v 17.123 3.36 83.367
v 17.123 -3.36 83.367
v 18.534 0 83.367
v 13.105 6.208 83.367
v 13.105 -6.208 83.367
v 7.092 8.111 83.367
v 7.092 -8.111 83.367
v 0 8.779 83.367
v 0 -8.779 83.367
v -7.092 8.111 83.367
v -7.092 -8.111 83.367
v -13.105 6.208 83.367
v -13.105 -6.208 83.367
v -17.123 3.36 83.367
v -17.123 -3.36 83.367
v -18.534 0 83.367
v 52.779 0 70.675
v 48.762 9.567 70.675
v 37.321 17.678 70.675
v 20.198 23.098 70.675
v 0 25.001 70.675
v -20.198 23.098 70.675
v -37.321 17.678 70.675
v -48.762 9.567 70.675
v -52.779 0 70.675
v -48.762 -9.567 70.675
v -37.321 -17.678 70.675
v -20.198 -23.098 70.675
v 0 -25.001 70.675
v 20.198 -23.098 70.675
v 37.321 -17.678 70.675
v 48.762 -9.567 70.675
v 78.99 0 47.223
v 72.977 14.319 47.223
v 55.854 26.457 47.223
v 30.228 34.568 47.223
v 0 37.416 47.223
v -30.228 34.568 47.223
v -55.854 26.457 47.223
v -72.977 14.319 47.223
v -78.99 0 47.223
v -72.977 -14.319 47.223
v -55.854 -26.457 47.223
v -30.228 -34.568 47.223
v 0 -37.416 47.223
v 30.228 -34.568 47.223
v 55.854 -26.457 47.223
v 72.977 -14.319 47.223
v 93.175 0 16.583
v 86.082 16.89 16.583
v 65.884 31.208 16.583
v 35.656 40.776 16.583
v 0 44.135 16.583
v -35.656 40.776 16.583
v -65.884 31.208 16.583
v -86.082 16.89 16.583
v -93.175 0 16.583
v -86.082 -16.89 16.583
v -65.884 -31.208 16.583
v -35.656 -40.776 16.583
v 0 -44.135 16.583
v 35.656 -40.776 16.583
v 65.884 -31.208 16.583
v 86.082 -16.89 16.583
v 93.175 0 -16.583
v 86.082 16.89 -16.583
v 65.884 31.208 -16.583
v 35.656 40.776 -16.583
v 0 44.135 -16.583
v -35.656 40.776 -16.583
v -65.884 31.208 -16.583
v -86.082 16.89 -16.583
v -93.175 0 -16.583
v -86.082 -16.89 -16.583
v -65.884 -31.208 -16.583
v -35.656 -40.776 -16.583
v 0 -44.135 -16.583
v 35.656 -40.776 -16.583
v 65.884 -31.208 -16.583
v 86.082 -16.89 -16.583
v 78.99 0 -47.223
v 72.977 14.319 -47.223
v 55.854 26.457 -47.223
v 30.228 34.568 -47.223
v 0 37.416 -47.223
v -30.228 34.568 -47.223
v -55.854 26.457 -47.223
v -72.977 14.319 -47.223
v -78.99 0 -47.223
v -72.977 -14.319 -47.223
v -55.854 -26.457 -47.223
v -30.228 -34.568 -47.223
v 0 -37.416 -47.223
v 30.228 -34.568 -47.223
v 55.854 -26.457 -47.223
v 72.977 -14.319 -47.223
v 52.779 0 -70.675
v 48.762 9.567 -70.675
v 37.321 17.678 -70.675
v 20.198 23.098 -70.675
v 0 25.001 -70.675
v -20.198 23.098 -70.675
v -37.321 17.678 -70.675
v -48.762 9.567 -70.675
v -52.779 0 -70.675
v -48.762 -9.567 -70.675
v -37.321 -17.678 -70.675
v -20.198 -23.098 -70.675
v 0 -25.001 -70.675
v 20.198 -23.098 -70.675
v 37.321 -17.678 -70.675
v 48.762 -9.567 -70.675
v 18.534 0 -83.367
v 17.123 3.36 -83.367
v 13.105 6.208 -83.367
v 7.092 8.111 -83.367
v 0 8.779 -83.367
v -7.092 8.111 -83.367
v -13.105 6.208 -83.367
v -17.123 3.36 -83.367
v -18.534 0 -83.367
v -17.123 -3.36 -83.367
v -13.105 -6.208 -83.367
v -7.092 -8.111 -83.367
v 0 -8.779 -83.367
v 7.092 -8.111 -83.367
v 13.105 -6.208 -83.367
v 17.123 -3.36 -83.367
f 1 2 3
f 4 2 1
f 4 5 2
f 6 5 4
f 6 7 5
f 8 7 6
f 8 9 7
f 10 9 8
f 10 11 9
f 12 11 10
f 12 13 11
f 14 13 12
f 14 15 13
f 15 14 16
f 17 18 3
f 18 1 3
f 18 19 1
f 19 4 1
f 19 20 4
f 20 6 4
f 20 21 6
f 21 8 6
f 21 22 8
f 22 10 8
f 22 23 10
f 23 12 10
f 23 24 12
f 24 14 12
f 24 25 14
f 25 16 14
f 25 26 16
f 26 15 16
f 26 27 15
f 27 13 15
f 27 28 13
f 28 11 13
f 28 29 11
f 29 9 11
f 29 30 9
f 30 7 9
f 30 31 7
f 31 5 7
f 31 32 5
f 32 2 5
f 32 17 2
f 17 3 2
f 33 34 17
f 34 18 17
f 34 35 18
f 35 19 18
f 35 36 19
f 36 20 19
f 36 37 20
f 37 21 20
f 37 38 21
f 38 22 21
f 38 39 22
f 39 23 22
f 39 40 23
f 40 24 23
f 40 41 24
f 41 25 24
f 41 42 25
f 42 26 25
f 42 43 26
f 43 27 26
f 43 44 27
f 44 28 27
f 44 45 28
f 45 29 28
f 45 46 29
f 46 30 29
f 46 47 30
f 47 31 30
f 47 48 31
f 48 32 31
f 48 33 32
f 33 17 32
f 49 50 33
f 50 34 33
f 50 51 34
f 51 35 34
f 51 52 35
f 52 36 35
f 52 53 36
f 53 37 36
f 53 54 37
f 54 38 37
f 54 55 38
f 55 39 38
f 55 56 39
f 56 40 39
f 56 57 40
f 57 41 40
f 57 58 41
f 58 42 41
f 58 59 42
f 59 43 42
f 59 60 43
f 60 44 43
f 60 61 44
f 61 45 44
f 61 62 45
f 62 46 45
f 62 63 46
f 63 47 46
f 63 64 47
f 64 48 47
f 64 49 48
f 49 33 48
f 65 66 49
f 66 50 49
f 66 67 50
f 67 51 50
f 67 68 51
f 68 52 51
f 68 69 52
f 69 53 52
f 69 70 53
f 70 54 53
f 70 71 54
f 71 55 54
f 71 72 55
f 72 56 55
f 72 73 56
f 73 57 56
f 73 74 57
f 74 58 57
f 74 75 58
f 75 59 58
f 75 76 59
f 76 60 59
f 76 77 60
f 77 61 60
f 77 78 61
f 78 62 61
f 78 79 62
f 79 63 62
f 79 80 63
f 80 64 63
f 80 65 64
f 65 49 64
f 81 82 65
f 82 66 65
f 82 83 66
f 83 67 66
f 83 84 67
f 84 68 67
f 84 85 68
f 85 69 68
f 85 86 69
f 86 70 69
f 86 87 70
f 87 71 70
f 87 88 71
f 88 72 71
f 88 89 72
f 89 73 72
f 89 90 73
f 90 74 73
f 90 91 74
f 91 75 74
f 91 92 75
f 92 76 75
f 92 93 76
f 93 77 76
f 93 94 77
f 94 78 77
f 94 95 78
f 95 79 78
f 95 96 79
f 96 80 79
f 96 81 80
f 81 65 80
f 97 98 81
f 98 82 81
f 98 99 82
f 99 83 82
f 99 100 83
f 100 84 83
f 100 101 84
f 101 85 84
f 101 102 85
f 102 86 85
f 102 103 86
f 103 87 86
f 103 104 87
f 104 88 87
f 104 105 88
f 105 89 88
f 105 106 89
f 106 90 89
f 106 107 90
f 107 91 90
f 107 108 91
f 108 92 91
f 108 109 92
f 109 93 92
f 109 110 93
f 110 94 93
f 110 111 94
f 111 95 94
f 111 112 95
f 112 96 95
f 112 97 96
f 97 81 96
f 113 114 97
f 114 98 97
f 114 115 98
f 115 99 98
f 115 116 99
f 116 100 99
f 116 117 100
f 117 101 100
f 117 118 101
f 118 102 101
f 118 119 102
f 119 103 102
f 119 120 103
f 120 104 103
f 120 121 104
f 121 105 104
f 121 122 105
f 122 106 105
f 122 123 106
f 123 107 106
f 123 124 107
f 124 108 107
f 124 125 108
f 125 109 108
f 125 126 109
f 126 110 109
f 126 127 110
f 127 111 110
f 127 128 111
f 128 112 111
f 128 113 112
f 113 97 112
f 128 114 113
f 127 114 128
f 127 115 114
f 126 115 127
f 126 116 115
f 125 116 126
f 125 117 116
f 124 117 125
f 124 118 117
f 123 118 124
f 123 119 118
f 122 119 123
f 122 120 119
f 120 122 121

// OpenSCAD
// Generated by SolidPython 1.0.1 on 2020-07-29 00:46:54


scale(v = [19, 9, 17]) {
	sphere(r = 5);
}
/***********************************************
*********      SolidPython code:      **********
************************************************
 
# import packages: SolidPython
from solid import *
from solid.utils import *
from itertools import chain, combinations, permutations


class Resize:

    def __init__(self, scad_file):
        self.scad_file = scad_file
        #self.scad_file = import_scad(scad_file)
        # cone/cylinder param:
        self.r1 = 0
        self.r2 = 0
        self.h = 0
        # rectangular prism param:
        self.w = 0
        self.l = 0
        # ellipse param:
        self.r = 0

    # import OpenScad code (file name corresponds to shape)


    # classify shape + parameters
    def assign(self, param1, param2, param3):
        if self.scad_file == 'cone.scad':
            self.r1 = param1
            self.r2 = param2
            self.h = param3
        elif self.scad_file == 'cylinder.scad':
            self.r1 = param1
            self.r2 = param2
            self.h = param3
        elif self.scad_file == 'rectangularPrism.scad':
            self.h = param1
            self.l = param2
            self.w = param3
        else:
            self.r = param1
            self.h = param2

    # resize parameters
    def iterate(self):
        x = range(3, 20, 2)
        i = 1
        if self.scad_file == 'cone.scad':
            tempList = list(permutations(x, 2))
            for temp in tempList:
                param1 = temp[0]
                param2 = temp[1]
                filepath = 'produced_scad_files/' + 'cone' + str(param1) + '_' + str(param2) + '_' + '.scad'
                scad_render_to_file(cylinder(h=param1, r1=param2, r2=0), filepath)

        elif self.scad_file == 'cylinder.scad':
            tempList = list(permutations(x, 3))
            for temp in tempList:
                param1 = temp[0]
                param2 = temp[1]
                filepath = 'produced_scad_files/' + 'cylinder' + str(param1) + '_' + str(param2) + '_' + '.scad'
                scad_render_to_file(cylinder(h=param1, r1=param2, r2=param2), filepath)

        elif self.scad_file == 'rectangularPrism.scad':
            tempList = list(permutations(x, 3))
            for temp in tempList:
                param1 = temp[0]
                param2 = temp[1]
                param3 = temp[2]
                filepath = 'produced_scad_files/' + 'rectangularPrism' + str(param1) + '_' + str(param2) + '_' + str(
                    param3) + '.scad'
                scad_render_to_file(cube(size=(param1, param2, param3)), filepath)

        elif self.scad_file == 'ellipse.scad':
            tempList = list(permutations(x, 4))
            for temp in tempList:
                param1 = temp[0]
                param2 = temp[1]
                param3 = temp[2]
                param4 = temp[3]
                filepath = 'produced_scad_files/' + 'ellipse' + str(param1) + '_' + str(param2) + '_' + str(param3) + '_' + str(param4) + '.scad'
                scad_render_to_file(scale([param1, param2, param3])(sphere(r=param4)), filepath)

    def render_to_scadfile(self):
        scad_render_to_file(scad, 'example.scad') 
 
************************************************/
